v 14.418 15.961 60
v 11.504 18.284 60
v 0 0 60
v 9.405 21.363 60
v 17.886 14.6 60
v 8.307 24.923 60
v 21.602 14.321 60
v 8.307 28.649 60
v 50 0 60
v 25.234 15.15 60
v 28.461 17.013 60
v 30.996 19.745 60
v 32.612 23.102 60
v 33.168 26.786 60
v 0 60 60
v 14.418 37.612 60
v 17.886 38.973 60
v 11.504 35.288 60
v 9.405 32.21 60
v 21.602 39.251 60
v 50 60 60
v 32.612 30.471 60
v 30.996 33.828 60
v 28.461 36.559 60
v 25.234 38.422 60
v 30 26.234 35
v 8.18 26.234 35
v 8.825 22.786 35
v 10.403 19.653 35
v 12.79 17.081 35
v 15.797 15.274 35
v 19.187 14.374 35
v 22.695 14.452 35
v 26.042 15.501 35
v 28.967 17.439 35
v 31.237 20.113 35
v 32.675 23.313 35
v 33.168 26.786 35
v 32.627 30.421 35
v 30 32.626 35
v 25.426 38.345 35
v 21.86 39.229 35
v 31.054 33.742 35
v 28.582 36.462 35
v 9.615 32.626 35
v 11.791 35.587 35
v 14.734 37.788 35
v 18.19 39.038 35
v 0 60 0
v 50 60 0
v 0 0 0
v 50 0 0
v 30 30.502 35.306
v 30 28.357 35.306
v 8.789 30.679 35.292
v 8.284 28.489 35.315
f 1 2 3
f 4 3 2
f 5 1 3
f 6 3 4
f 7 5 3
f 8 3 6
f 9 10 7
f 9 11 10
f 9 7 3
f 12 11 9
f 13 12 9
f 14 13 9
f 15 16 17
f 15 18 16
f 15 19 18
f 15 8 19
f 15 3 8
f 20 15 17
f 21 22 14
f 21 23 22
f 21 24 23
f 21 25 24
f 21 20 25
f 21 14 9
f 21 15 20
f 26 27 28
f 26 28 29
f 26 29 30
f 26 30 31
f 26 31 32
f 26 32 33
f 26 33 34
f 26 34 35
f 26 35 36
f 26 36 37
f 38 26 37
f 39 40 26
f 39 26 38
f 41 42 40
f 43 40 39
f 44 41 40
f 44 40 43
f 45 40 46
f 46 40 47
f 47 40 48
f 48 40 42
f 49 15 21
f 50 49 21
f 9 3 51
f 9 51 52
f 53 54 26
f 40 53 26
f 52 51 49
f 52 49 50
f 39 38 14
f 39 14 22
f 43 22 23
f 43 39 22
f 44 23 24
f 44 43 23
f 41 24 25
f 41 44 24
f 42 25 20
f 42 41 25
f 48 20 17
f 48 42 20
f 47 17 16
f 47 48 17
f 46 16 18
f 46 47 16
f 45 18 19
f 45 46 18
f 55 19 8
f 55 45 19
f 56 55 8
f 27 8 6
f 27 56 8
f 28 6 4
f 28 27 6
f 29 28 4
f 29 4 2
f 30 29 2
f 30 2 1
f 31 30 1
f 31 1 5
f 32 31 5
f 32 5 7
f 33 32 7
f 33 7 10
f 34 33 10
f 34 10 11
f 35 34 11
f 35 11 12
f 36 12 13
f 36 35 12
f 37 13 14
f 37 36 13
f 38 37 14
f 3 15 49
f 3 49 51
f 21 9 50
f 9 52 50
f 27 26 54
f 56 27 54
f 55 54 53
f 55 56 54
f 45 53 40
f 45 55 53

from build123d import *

# Parameters (mm, degrees)
F0_W     = 50
F0_H     = 60
F1_DEPTH = 35
F2_W     = 50
F2_H     = 60
F2_R     = 12.5
F3_DEPTH = 25
F4_R     = 15
F5_DEPTH = 30


with BuildPart() as f1:
    # F0 (on Top) → F1 (new body)
    with BuildSketch(Plane.XY):
        with Locations((25, 30)):
            Rectangle(F0_W, F0_H)
    extrude(amount=F1_DEPTH)

    # F2 (on face) → F3 (join)
    with BuildSketch(Plane.XY.offset(35)):
        with Locations((25, 30)):
            Rectangle(F2_W, F2_H)
        with Locations((20.667605, 26.786247)):
            Circle(F2_R, mode=Mode.SUBTRACT)
    extrude(amount=F3_DEPTH)

    # F4 (on face) → F5 (join)
    with BuildSketch(Plane(origin=(0, 0, 0), x_dir=(0, -1, 0), z_dir=(-1, 0, 0))):
        with Locations((-29.429901, 20.344391)):
            Circle(F4_R)
    extrude(amount=-F5_DEPTH)


solid = f1.part
